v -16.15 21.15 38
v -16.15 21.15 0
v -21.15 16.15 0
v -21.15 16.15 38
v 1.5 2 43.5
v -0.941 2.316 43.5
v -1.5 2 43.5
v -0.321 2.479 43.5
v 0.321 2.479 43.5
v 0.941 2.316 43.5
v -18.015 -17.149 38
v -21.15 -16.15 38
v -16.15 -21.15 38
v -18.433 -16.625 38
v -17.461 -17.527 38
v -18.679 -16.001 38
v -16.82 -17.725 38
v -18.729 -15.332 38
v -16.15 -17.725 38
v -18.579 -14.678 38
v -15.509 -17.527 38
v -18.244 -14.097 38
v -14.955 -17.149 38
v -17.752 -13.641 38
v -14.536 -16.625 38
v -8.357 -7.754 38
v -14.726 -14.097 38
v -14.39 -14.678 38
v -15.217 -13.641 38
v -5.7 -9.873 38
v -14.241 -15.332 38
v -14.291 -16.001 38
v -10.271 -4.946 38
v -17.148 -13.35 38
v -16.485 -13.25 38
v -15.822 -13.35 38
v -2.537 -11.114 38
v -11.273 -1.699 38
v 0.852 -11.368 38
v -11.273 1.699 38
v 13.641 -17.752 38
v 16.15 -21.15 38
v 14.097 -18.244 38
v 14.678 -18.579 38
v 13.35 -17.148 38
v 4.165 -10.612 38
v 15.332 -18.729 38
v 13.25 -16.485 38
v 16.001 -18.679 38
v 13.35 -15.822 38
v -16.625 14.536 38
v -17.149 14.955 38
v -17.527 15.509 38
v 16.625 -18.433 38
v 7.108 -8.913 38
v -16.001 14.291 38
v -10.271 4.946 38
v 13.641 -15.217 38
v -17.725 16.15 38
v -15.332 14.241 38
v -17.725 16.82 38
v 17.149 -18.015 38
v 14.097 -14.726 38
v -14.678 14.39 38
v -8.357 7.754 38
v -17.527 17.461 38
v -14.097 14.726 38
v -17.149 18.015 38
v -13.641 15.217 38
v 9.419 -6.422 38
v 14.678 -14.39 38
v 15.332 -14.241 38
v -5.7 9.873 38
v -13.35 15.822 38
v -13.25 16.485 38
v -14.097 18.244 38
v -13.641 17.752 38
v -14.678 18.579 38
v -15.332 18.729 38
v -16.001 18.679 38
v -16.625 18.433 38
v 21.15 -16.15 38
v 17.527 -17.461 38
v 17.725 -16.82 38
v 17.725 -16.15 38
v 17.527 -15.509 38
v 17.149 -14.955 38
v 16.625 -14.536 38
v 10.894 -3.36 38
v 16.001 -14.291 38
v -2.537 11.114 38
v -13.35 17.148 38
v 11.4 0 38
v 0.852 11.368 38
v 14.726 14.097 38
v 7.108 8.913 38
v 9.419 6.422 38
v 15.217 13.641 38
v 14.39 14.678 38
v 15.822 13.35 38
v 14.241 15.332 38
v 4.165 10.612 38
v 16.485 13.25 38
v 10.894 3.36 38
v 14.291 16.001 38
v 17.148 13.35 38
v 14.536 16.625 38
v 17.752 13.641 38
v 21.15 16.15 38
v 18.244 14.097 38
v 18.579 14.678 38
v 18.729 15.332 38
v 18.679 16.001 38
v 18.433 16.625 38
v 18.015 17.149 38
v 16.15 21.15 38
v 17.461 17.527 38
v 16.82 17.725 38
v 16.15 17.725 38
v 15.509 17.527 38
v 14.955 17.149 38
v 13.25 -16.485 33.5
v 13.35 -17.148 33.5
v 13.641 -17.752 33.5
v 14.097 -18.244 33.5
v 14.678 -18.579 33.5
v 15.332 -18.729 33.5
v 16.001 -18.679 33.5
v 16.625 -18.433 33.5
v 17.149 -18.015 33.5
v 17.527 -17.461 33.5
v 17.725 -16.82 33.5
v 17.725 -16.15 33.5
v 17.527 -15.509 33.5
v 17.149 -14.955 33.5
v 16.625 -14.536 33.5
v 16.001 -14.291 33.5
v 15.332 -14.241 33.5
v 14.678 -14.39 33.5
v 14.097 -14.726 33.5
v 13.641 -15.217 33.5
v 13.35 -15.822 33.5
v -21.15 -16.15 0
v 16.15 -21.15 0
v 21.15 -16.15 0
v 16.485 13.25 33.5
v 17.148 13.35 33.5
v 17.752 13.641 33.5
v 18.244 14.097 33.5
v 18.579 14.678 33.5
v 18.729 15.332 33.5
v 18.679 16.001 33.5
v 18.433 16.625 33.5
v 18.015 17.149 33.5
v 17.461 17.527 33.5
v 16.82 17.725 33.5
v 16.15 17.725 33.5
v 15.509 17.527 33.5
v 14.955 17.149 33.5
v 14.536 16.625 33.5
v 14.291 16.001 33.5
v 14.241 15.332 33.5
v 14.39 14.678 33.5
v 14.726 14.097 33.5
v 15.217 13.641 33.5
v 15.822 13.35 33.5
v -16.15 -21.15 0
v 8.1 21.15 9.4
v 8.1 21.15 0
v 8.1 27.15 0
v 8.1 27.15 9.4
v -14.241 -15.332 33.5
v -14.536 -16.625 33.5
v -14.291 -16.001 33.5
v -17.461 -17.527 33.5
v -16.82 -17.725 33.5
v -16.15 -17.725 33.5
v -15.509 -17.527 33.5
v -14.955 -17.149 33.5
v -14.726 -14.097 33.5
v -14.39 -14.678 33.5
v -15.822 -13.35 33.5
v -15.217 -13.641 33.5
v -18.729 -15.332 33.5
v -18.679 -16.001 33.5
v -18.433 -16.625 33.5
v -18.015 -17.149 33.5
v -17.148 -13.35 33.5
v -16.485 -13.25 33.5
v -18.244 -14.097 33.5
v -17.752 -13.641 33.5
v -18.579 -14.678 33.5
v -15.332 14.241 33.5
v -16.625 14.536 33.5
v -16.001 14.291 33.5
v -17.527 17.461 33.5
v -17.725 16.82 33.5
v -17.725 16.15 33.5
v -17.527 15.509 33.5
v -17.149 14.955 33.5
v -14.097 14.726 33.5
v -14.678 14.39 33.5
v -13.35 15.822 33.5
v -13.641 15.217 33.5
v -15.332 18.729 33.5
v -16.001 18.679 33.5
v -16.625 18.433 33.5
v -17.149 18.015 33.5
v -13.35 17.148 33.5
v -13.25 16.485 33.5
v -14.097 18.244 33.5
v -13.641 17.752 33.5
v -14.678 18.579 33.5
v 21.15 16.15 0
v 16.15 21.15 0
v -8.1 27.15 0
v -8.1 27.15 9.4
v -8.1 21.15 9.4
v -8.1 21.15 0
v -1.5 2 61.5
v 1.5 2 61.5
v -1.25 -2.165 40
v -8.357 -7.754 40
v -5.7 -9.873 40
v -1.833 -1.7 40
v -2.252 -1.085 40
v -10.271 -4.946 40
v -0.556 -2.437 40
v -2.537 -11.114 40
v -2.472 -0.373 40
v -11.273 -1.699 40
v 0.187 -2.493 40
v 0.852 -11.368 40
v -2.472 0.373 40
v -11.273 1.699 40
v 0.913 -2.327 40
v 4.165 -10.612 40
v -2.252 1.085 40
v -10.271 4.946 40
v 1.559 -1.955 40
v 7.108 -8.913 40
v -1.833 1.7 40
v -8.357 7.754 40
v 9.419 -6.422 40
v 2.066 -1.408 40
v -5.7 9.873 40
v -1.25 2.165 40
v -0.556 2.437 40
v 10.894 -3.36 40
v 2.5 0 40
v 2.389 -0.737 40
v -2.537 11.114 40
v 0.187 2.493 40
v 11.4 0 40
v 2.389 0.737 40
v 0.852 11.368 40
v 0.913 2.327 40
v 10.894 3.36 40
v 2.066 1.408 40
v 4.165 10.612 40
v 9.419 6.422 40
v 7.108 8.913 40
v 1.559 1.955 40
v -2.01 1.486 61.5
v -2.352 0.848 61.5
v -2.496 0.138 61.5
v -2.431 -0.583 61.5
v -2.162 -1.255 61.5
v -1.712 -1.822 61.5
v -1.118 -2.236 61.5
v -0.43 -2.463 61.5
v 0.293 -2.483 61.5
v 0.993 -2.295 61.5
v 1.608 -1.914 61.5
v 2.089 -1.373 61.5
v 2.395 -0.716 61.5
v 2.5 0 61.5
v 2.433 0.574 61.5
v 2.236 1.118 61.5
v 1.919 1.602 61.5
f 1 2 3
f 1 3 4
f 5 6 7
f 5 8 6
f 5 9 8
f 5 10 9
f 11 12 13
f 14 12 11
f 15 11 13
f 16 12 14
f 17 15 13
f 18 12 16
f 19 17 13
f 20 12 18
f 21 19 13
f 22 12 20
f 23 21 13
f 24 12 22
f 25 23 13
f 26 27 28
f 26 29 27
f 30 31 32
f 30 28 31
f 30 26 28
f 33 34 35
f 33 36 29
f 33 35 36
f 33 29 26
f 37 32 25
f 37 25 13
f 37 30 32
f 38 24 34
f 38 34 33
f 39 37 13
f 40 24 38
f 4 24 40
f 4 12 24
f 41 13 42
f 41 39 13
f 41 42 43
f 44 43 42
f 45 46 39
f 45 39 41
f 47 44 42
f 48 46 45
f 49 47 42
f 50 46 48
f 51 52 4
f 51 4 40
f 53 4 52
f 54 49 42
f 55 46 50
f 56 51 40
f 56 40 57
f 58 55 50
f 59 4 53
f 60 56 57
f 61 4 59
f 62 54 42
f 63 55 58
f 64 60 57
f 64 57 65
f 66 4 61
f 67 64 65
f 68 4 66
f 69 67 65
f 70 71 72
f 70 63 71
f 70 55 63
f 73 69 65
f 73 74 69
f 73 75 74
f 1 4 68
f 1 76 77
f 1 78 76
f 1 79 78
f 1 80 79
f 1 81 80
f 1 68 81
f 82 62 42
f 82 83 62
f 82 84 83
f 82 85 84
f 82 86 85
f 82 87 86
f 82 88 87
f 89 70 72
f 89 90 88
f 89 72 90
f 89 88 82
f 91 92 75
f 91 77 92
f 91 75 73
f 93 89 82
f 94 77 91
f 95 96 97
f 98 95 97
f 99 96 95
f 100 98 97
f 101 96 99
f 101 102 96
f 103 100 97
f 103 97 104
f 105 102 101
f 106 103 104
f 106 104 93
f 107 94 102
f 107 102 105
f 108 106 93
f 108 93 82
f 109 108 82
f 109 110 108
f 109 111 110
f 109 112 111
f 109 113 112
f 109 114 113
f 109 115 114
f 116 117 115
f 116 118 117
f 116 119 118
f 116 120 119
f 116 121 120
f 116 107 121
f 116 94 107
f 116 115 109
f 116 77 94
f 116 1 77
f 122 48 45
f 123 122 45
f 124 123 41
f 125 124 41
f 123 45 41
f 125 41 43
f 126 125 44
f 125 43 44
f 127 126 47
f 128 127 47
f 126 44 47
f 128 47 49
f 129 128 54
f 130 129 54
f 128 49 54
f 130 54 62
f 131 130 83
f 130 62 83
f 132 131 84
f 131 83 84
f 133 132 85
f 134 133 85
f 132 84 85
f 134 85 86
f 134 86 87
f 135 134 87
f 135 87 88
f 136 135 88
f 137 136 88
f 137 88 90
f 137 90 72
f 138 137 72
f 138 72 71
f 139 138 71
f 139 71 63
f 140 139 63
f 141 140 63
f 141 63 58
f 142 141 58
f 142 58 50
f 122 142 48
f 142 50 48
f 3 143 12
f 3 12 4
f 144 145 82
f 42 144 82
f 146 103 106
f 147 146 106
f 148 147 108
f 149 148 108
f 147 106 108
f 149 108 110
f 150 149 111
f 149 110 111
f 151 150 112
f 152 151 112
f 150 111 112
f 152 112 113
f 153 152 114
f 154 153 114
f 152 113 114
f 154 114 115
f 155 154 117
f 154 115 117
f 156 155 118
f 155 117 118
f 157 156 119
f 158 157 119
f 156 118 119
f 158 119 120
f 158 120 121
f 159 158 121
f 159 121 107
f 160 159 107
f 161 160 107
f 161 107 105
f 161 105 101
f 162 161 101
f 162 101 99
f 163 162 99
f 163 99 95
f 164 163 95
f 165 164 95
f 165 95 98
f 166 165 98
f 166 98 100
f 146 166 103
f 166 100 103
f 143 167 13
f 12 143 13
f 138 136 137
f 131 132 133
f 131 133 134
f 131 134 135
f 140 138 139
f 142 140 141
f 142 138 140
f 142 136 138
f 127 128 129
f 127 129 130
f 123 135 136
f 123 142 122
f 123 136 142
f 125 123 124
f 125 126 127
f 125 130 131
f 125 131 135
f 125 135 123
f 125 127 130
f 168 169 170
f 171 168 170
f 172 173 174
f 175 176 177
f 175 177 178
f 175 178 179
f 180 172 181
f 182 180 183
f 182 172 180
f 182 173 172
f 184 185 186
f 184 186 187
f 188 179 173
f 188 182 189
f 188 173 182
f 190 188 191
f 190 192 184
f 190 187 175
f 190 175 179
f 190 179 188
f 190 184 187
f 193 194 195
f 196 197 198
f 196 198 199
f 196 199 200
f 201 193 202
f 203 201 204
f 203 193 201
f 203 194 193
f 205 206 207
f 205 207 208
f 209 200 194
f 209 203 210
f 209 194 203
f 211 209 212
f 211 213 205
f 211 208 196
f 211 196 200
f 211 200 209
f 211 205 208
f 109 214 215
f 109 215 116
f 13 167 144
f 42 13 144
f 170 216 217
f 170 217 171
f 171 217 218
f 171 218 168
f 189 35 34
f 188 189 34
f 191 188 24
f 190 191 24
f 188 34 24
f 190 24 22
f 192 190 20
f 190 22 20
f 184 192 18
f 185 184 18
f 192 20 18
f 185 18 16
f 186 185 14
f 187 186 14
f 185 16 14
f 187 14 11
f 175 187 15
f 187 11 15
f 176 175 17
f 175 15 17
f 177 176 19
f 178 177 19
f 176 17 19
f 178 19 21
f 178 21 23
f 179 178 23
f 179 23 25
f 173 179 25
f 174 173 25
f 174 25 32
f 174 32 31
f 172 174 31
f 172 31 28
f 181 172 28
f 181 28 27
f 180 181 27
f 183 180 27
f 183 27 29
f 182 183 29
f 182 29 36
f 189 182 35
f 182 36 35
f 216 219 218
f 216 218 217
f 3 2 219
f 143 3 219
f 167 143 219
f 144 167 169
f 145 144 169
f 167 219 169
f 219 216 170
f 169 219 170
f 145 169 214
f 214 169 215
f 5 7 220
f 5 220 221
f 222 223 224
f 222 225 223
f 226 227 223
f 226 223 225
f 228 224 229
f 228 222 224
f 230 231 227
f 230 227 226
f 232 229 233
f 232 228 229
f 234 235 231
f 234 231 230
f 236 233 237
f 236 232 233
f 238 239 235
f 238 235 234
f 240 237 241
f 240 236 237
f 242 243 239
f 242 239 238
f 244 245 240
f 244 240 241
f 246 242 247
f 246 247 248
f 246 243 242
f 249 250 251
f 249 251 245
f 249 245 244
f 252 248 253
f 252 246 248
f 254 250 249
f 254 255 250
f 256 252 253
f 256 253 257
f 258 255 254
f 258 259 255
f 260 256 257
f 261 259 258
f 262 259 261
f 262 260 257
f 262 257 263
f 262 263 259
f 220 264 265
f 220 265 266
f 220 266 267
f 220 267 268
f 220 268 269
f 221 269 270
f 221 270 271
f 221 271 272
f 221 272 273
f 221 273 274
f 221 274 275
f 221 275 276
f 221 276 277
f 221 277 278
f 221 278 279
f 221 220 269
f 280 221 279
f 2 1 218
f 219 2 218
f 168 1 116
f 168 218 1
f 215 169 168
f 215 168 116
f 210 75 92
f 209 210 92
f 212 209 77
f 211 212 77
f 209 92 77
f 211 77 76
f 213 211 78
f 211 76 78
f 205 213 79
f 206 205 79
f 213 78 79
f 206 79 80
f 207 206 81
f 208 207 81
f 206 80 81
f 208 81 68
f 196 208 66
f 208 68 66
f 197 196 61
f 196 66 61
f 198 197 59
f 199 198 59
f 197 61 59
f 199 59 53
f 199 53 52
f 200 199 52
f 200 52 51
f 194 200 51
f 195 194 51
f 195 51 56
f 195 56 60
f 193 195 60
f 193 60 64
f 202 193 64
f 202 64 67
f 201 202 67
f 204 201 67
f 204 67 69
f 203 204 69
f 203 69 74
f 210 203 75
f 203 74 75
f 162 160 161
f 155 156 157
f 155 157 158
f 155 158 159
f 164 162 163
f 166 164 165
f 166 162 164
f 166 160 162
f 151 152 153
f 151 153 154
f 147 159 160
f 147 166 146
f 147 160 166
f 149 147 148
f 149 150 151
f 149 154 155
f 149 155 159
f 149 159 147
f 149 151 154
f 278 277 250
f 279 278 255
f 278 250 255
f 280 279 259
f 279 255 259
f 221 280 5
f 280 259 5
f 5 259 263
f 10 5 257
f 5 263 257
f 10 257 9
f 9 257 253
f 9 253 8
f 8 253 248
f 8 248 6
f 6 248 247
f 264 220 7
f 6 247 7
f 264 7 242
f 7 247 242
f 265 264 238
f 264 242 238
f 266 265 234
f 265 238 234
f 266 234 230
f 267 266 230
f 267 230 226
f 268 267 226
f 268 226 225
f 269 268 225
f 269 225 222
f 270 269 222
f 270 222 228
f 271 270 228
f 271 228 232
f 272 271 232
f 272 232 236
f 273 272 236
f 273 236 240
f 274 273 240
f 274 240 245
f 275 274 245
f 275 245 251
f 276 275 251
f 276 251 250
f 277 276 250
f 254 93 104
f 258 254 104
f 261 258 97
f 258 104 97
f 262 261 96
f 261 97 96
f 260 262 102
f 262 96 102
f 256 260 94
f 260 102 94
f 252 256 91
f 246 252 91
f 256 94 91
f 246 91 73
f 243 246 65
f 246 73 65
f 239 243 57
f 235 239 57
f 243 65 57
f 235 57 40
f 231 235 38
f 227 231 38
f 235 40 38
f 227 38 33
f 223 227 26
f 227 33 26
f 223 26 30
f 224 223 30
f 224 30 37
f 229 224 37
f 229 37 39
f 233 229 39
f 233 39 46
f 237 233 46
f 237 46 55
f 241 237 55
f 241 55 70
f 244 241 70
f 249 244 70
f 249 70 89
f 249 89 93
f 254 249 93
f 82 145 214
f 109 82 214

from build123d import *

# Parameters (mm, degrees)
SKETCH_W           = 42.3
SKETCH_H           = 42.3
PAD_DEPTH          = 38
SKETCH001_R        = 11.4
PAD001_DEPTH       = 40
SKETCH002_R        = 2.5
PAD002_DEPTH       = 61.5
CHAMFER_SIZE       = 5
SKETCH003_W        = 10
SKETCH003_H        = 3
POCKET_DEPTH       = 18
SKETCH004_W        = 16.2
SKETCH004_H        = 27.15
PAD003_DEPTH       = 9.4
SKETCH005_R        = 2.25
POCKET001_DEPTH    = 4.5
POLARPATTERN_COUNT = 4


with BuildPart() as part:
    # Sketch → Pad (new body)
    with BuildSketch(Plane.XY):
        Rectangle(SKETCH_W, SKETCH_H)
    extrude(amount=PAD_DEPTH)

    # Sketch001 → Pad001 (join)
    with BuildSketch(Plane.XY):
        Circle(SKETCH001_R)
    extrude(amount=PAD001_DEPTH)

    # Sketch002 → Pad002 (join)
    with BuildSketch(Plane.XY):
        Circle(SKETCH002_R)
    extrude(amount=PAD002_DEPTH)

    # Chamfer
    chamfer_edges = [part.edges().sort_by_distance(p)[0] for p in [
        (-21.15, 21.15, 19),
        (-21.15, -21.15, 19),
        (21.15, 21.15, 19),
        (21.15, -21.15, 19),
    ]]
    chamfer(chamfer_edges, length=CHAMFER_SIZE)

    # Sketch003 (on Face16 of Chamfer) → Pocket (cut)
    with BuildSketch(Plane.XY.offset(61.5)):
        with Locations((0, 3.5)):
            Rectangle(SKETCH003_W, SKETCH003_H)
    extrude(amount=-POCKET_DEPTH, mode=Mode.SUBTRACT)

    # Sketch004 → Pad003 (join)
    with BuildSketch(Plane.XY):
        with Locations((0, 13.575)):
            Rectangle(SKETCH004_W, SKETCH004_H)
    extrude(amount=PAD003_DEPTH)

    # Sketch005 (on Face5 of Pad003) → Pocket001 (cut)
    with BuildSketch(Plane.XY.offset(38)):
        with Locations((-15.5, 16.484926)):
            Circle(SKETCH005_R)
    pocket001 = extrude(amount=-POCKET001_DEPTH, mode=Mode.SUBTRACT)

    # PolarPattern: Pocket001 ×4 about axis
    polarpattern_axis = Axis((0, 0, 38), (0, 0, 1))
    for i in range(1, POLARPATTERN_COUNT):
        add(pocket001.rotate(polarpattern_axis, i * 360 / POLARPATTERN_COUNT), mode=Mode.SUBTRACT)


solid = part.part
